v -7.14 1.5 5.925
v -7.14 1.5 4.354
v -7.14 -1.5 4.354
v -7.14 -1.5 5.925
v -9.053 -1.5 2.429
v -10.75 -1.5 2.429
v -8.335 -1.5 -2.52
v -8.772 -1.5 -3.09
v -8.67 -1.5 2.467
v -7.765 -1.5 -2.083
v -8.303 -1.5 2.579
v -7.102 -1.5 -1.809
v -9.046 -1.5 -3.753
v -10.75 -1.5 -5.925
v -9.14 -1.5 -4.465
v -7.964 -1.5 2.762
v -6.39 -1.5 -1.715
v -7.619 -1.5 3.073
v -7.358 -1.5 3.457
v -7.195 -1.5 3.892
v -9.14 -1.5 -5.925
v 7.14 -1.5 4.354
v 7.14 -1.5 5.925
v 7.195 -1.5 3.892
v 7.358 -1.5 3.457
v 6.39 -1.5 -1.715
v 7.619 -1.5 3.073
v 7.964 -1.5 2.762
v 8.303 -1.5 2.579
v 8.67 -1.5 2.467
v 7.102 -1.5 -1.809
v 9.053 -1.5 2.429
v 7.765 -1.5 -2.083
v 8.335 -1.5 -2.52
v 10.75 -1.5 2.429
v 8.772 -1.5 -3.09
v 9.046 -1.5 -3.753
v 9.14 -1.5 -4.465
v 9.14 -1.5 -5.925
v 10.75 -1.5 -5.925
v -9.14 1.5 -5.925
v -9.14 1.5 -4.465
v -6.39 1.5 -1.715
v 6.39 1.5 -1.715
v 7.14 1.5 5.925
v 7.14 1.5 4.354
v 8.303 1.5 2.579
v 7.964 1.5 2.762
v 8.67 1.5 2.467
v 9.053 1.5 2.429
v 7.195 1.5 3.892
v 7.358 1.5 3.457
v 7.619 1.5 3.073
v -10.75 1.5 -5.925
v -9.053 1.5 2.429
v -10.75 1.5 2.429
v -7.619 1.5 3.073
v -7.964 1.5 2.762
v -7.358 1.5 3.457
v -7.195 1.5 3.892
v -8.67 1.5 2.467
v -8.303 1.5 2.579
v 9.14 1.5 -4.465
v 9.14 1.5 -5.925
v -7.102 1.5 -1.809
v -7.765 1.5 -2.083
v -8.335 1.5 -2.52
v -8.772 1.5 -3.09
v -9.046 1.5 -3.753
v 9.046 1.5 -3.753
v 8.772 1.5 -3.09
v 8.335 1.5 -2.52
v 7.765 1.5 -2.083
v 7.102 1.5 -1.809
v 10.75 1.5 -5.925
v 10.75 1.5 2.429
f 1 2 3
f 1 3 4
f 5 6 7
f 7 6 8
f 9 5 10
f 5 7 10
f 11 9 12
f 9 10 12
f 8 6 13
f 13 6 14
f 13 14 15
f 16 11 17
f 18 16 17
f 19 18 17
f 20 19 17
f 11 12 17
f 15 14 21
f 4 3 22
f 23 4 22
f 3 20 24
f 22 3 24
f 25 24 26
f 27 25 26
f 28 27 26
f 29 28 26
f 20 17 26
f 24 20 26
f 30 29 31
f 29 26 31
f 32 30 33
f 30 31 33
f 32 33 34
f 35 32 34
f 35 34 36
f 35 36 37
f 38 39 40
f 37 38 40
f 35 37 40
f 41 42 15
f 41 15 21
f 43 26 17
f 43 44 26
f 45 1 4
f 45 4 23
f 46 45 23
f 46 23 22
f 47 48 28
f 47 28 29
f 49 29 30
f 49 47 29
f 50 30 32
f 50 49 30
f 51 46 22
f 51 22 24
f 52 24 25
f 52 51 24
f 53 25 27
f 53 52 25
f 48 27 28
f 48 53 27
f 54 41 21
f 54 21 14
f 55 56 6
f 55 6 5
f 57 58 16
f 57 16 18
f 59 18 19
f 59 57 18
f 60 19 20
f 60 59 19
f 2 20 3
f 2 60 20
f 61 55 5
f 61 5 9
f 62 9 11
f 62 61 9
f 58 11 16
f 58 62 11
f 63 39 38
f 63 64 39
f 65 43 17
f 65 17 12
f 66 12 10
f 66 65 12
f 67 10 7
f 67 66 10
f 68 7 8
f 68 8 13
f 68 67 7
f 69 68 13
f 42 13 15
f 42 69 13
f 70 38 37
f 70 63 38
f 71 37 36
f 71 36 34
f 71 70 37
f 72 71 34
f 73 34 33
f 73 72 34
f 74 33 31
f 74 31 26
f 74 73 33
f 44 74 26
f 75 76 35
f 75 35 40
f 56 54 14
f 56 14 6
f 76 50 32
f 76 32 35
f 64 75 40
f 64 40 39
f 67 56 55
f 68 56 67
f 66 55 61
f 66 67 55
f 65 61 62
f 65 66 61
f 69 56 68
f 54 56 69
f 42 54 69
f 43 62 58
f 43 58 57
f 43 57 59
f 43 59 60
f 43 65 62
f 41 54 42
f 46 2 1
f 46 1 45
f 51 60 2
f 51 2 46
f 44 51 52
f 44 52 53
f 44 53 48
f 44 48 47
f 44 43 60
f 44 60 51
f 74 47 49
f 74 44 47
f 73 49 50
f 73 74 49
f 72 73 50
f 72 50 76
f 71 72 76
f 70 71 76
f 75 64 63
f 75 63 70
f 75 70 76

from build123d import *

# Parameters (mm, degrees)
BOSS_EXTRUDE1_DEPTH = 1.5


with BuildPart() as part:
    # Sketch3 → Boss-Extrude1 (new body, symmetric)
    with BuildSketch(Plane(origin=(0, 0, 0), x_dir=(1, 0, 0), z_dir=(0, 1, 0))):
        with BuildLine():
            Line((6.39, 1.715), (-6.39, 1.715))
            ThreePointArc((-6.39, 1.715), (-8.334543648, 2.520456352), (-9.14, 4.465))
            Line((-9.14, 4.465), (-9.14, 5.925))
            Line((-9.14, 5.925), (-10.75, 5.925))
            Line((-10.75, 5.925), (-10.75, -2.428885313))
            Line((-10.75, -2.428885313), (-9.053324958, -2.428885313))
            ThreePointArc((-9.053324958, -2.428885313), (-8.483744199, -2.513924788), (-7.963842259, -2.761626073))
            ThreePointArc((-7.963842259, -2.761626073), (-7.358164616, -3.457324711), (-7.14, -4.353564747))
            Line((-7.14, -4.353564747), (-7.14, -5.925))
            Line((-7.14, -5.925), (7.14, -5.925))
            Line((7.14, -5.925), (7.14, -4.353564747))
            ThreePointArc((7.14, -4.353564747), (7.358164616, -3.457324711), (7.963842259, -2.761626073))
            ThreePointArc((7.963842259, -2.761626073), (8.483744199, -2.513924788), (9.053324958, -2.428885313))
            Line((9.053324958, -2.428885313), (10.75, -2.428885313))
            Line((10.75, -2.428885313), (10.75, 5.925))
            Line((10.75, 5.925), (9.14, 5.925))
            Line((9.14, 5.925), (9.14, 4.465))
            ThreePointArc((9.14, 4.465), (8.334543648, 2.520456352), (6.39, 1.715))
        make_face()
    extrude(amount=BOSS_EXTRUDE1_DEPTH, both=True)


solid = part.part
